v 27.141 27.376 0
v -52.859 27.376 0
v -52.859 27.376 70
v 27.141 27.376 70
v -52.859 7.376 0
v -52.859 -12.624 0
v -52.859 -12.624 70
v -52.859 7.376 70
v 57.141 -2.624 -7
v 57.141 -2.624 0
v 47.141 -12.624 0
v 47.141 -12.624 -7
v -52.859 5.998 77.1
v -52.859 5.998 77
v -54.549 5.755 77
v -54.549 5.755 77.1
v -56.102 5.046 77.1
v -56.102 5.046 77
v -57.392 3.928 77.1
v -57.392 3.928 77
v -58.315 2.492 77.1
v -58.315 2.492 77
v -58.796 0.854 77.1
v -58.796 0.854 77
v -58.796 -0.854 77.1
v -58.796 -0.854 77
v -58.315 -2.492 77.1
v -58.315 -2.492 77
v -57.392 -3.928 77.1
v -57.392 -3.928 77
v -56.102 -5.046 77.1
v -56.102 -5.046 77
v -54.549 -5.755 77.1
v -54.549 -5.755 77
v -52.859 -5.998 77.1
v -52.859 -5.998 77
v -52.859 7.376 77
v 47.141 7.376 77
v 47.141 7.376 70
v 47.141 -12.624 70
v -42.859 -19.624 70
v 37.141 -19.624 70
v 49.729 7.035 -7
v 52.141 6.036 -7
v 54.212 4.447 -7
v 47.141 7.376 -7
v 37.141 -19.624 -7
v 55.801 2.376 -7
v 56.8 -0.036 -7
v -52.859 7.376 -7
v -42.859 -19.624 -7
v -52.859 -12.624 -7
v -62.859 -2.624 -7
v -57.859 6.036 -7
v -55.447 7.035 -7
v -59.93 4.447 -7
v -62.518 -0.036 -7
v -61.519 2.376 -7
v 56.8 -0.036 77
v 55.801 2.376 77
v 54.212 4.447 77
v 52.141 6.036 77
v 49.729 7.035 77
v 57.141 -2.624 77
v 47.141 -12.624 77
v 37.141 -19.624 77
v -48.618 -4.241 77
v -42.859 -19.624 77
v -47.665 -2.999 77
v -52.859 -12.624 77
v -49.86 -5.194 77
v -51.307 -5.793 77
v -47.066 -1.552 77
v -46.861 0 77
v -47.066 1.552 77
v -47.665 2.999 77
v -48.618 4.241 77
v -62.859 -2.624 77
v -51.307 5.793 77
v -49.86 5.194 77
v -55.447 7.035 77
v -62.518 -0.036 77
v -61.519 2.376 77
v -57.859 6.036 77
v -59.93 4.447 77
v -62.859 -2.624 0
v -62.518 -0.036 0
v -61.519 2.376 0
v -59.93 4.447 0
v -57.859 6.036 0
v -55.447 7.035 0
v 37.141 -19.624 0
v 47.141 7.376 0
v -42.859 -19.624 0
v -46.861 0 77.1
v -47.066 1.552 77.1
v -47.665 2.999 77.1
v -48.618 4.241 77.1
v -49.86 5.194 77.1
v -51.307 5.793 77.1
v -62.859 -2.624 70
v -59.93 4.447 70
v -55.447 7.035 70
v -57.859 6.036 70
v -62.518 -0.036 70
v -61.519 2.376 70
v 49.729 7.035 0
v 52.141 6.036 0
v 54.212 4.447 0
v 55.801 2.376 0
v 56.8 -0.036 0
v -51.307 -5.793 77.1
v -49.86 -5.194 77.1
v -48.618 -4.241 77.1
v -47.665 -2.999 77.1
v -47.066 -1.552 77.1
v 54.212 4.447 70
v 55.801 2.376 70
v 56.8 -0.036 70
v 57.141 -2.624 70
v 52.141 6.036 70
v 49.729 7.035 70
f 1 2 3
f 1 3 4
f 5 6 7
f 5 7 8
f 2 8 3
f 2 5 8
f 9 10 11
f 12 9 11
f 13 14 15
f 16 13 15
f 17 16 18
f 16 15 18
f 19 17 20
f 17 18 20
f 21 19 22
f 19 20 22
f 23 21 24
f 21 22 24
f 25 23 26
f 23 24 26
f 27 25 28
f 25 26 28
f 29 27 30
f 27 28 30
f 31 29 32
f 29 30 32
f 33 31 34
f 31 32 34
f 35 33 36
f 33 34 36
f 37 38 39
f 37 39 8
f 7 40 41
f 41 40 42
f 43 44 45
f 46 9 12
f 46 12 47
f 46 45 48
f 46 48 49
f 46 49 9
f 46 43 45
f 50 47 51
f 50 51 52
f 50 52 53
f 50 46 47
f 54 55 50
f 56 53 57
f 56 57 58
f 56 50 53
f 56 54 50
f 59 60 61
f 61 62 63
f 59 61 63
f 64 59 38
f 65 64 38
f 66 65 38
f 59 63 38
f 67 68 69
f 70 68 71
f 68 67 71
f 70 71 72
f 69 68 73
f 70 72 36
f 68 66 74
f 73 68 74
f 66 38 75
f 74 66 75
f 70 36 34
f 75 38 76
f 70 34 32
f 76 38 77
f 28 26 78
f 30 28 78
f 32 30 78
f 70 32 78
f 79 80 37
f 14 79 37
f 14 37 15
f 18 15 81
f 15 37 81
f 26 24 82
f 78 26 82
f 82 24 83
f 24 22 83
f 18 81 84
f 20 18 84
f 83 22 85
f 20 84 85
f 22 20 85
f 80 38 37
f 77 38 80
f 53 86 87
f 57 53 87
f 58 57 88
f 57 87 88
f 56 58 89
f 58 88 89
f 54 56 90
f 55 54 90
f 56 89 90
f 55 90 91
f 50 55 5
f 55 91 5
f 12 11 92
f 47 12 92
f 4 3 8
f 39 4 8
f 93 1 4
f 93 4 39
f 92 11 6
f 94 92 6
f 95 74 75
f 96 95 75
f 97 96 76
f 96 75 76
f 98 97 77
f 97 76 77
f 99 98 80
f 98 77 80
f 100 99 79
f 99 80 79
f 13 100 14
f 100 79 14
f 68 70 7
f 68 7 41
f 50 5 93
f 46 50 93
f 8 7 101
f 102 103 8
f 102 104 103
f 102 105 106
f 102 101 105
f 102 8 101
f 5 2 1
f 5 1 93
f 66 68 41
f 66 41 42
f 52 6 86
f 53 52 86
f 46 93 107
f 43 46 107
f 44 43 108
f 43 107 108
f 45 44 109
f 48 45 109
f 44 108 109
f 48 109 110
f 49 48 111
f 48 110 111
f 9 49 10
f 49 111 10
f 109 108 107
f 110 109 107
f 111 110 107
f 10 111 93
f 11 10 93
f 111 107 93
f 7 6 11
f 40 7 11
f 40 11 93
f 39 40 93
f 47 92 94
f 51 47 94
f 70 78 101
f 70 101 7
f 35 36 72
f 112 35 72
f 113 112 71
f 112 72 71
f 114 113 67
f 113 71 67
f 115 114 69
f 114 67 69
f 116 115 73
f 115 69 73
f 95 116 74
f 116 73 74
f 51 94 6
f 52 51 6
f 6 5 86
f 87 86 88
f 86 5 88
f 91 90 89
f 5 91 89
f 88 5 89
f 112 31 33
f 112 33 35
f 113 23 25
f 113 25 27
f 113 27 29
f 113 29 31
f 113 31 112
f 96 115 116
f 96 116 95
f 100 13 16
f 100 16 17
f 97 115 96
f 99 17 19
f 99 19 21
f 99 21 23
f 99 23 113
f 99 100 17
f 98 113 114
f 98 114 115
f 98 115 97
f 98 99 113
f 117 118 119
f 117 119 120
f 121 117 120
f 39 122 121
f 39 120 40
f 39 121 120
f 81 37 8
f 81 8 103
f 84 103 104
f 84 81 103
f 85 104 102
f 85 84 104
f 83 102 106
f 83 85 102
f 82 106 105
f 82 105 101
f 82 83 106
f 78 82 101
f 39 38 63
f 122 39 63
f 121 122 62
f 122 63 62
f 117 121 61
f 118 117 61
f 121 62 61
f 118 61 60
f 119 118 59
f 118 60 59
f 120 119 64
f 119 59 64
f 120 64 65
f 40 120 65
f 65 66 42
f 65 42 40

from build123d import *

# Parameters (mm, degrees)
ESQUISSE1_W                  = 100
ESQUISSE1_H                  = 40
BOSS_EXTRU_3_DEPTH           = 70
ENL_V_MAT_EXTRU_1_DEPTH      = 92.8886174
ENL_V_MAT_EXTRU_1_DEPTH_BACK = 92.8886174
BOSS_EXTRU_5_DEPTH           = 7
BOSS_EXTRU_6_START           = 7
ESQUISSE4_W                  = 80
ESQUISSE4_H                  = 7
BOSS_EXTRU_6_DEPTH           = 7
BOSS_EXTRU_7_DEPTH           = 0.1


with BuildPart() as part:
    # Esquisse1 → Boss.-Extru.3 (new body)
    with BuildSketch(Plane.XY):
        with Locations((-2.858975564, 7.376024363)):
            Rectangle(ESQUISSE1_W, ESQUISSE1_H)
    extrude(amount=BOSS_EXTRU_3_DEPTH)

    # Esquisse2 → Enlèv. mat.-Extru.1 (cut, two sides: drawn at the far end of the back side and taken through both)
    with BuildSketch(Plane.XY.offset(70).offset(-ENL_V_MAT_EXTRU_1_DEPTH_BACK)):
        Polygon((-124.152094394, 178.669143194), (27.141024436, 27.376024363), (47.141024436, 7.376024363), (198.434143267, -143.917094467), (501.020380927, 158.669143194), (178.434143267, 481.255380855), align=None)
    extrude(amount=ENL_V_MAT_EXTRU_1_DEPTH + ENL_V_MAT_EXTRU_1_DEPTH_BACK, mode=Mode.SUBTRACT)

    # Esquisse3 → Boss.-Extru.5 (add)
    with BuildSketch(Plane(origin=(0, 0, 0), x_dir=(-1, 0, 0), z_dir=(0, 0, -1))):
        with BuildLine():
            Line((-57.141024436, -2.623975637), (-47.141024436, -12.623975637))
            Line((-47.141024436, -12.623975637), (-37.141024436, -19.623975637))
            Line((-37.141024436, -19.623975637), (42.858975564, -19.623975637))
            Line((42.858975564, -19.623975637), (52.858975564, -12.623975637))
            Line((52.858975564, -12.623975637), (62.858975564, -2.623975637))
            ThreePointArc((62.858975564, -2.623975637), (59.930043376, 4.447092175), (52.858975564, 7.376024363))
            Line((52.858975564, 7.376024363), (-47.141024436, 7.376024363))
            ThreePointArc((-47.141024436, 7.376024363), (-54.212092248, 4.447092175), (-57.141024436, -2.623975637))
        make_face()
    extrude(amount=BOSS_EXTRU_5_DEPTH)

    # Esquisse4 → Boss.-Extru.6 (add)
    with BuildSketch(Plane.XY.offset(70).offset(BOSS_EXTRU_6_START)):
        with BuildLine():
            ThreePointArc((47.141024436, 7.376024363), (54.212092248, 4.447092175), (57.141024436, -2.623975637))
            Line((57.141024436, -2.623975637), (47.141024436, -12.623975637))
            Line((47.141024436, -12.623975637), (47.141024436, 7.376024363))
        make_face()
        Polygon((47.141024436, 7.376024363), (-52.858975564, 7.376024363), (-52.858975564, -12.623975637), (-42.858975564, -12.623975637), (37.141024436, -12.623975637), (47.141024436, -12.623975637), align=None)
        Polygon((37.141024436, -19.623975637), (47.141024436, -12.623975637), (37.141024436, -12.623975637), align=None)
        with Locations((-2.858975564, -16.123975637)):
            Rectangle(ESQUISSE4_W, ESQUISSE4_H)
        Polygon((-42.858975564, -12.623975637), (-52.858975564, -12.623975637), (-42.858975564, -19.623975637), align=None)
        with BuildLine():
            Line((-52.858975564, -12.623975637), (-52.858975564, 7.376024363))
            ThreePointArc((-52.858975564, 7.376024363), (-59.930043376, 4.447092175), (-62.858975564, -2.623975637))
            Line((-62.858975564, -2.623975637), (-52.858975564, -12.623975637))
        make_face()
    extrude(amount=-BOSS_EXTRU_6_DEPTH)

    # Esquisse5 → Boss.-Extru.7 (add)
    with BuildSketch(Plane.XY.offset(77)):
        with BuildLine():
            ThreePointArc((-52.858975564, 5.997782361), (-58.856757925, 0), (-52.858975564, -5.997782361))
            Line((-52.858975564, -5.997782361), (-52.858975564, 5.997782361))
        make_face()
        with BuildLine():
            Line((-52.858975564, 5.997782361), (-52.858975564, -5.997782361))
            ThreePointArc((-52.858975564, -5.997782361), (-48.617902985, -4.241072579), (-46.861193203, 0))
            ThreePointArc((-46.861193203, 0), (-48.617902985, 4.241072579), (-52.858975564, 5.997782361))
        make_face()
    extrude(amount=BOSS_EXTRU_7_DEPTH)


solid = part.part
